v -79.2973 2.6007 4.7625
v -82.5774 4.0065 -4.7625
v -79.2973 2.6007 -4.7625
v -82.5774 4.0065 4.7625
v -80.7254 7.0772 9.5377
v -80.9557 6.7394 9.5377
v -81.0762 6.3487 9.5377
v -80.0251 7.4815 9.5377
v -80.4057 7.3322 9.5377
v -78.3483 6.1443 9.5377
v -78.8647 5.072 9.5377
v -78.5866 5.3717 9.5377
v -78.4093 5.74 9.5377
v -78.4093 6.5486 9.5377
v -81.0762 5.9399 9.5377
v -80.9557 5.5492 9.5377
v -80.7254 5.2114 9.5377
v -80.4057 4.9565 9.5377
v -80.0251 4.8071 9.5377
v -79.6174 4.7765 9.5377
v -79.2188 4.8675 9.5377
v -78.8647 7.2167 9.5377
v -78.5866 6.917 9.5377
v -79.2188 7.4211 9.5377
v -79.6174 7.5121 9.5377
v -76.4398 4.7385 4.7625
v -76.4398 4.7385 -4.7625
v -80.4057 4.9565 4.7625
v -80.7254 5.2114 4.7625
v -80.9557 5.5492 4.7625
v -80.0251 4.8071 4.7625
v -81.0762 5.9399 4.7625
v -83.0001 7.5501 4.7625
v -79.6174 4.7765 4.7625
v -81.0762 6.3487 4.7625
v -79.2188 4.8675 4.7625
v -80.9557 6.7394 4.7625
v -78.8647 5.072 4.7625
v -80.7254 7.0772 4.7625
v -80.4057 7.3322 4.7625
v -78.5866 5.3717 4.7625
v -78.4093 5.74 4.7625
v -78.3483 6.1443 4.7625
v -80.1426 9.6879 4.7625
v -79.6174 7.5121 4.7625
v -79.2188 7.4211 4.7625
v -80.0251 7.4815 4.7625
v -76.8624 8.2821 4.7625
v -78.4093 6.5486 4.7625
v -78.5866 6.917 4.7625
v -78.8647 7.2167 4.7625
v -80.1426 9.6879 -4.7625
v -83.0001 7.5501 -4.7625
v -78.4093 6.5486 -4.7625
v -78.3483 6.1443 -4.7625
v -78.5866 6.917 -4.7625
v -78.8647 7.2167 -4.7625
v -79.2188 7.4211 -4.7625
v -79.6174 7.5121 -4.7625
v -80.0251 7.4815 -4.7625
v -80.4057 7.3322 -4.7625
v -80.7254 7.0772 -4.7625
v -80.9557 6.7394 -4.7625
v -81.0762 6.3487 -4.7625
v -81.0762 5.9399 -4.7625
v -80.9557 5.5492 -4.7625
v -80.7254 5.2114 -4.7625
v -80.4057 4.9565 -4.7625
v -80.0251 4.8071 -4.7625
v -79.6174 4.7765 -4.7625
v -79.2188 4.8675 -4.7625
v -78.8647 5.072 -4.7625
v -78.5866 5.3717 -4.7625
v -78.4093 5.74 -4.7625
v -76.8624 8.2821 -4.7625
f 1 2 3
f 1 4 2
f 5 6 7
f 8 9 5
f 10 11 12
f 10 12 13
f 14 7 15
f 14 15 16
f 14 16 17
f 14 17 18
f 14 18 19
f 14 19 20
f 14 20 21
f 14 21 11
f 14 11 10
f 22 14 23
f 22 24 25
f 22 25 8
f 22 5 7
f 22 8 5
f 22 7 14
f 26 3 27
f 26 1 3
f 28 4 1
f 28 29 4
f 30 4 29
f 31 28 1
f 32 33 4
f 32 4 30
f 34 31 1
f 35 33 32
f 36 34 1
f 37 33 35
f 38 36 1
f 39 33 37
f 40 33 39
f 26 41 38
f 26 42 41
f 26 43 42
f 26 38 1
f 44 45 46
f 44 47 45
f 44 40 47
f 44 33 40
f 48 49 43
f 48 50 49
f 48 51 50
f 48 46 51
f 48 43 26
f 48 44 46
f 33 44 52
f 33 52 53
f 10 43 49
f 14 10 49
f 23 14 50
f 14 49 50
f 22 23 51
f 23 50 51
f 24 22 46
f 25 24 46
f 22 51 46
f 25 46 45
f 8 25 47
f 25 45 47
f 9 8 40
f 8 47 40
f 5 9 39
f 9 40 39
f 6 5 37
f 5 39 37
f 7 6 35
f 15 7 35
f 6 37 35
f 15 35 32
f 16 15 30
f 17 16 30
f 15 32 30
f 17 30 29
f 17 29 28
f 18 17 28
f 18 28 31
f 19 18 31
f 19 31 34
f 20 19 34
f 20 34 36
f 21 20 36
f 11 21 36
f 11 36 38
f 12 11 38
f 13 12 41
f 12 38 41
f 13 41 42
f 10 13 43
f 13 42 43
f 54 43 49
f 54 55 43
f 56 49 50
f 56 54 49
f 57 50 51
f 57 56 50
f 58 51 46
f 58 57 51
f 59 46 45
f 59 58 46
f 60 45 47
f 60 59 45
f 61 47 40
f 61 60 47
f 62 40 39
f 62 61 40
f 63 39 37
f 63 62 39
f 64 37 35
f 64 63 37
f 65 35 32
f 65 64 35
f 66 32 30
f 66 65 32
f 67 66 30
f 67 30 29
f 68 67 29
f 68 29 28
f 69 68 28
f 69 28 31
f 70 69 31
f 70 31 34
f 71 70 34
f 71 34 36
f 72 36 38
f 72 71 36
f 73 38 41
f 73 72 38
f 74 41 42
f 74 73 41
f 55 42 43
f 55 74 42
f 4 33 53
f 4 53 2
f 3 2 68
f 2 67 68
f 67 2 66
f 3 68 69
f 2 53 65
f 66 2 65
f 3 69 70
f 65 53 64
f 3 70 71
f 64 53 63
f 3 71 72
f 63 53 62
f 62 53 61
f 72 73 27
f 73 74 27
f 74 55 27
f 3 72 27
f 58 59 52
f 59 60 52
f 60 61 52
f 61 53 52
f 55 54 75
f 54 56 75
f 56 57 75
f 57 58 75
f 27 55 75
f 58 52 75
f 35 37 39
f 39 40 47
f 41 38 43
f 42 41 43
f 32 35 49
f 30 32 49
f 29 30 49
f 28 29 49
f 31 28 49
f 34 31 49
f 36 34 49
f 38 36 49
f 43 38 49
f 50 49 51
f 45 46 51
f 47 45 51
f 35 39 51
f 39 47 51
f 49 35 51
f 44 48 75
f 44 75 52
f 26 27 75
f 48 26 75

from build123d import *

# Parameters (mm, degrees)
SKETCH7_R           = 1.3716
BOSS_EXTRUDE4_DEPTH = 4.7625
SKETCH8_R           = 1.3716
BOSS_EXTRUDE5_DEPTH = 4.7752


with BuildPart() as part:
    # Sketch7 → Boss-Extrude4 (new, symmetric)
    with BuildSketch(Plane.XY):
        Polygon((-76.439762625, 4.738534743), (-76.86239804, 8.282120356), (-80.142550908, 9.687900156), (-83.000068362, 7.550094344), (-82.577432948, 4.006508731), (-79.297280079, 2.600728931), align=None)
        with Locations((-79.719915494, 6.144314544)):
            Circle(SKETCH7_R, mode=Mode.SUBTRACT)
    extrude(amount=BOSS_EXTRUDE4_DEPTH, both=True)


with BuildPart() as body_2:
    # Sketch8 → Boss-Extrude5 (new body)
    with BuildSketch(Plane.XY.offset(4.7625)):
        with Locations((-79.719915494, 6.144314544)):
            Circle(SKETCH8_R)
    extrude(amount=BOSS_EXTRUDE5_DEPTH)


solid = Compound([part.part, body_2.part])
